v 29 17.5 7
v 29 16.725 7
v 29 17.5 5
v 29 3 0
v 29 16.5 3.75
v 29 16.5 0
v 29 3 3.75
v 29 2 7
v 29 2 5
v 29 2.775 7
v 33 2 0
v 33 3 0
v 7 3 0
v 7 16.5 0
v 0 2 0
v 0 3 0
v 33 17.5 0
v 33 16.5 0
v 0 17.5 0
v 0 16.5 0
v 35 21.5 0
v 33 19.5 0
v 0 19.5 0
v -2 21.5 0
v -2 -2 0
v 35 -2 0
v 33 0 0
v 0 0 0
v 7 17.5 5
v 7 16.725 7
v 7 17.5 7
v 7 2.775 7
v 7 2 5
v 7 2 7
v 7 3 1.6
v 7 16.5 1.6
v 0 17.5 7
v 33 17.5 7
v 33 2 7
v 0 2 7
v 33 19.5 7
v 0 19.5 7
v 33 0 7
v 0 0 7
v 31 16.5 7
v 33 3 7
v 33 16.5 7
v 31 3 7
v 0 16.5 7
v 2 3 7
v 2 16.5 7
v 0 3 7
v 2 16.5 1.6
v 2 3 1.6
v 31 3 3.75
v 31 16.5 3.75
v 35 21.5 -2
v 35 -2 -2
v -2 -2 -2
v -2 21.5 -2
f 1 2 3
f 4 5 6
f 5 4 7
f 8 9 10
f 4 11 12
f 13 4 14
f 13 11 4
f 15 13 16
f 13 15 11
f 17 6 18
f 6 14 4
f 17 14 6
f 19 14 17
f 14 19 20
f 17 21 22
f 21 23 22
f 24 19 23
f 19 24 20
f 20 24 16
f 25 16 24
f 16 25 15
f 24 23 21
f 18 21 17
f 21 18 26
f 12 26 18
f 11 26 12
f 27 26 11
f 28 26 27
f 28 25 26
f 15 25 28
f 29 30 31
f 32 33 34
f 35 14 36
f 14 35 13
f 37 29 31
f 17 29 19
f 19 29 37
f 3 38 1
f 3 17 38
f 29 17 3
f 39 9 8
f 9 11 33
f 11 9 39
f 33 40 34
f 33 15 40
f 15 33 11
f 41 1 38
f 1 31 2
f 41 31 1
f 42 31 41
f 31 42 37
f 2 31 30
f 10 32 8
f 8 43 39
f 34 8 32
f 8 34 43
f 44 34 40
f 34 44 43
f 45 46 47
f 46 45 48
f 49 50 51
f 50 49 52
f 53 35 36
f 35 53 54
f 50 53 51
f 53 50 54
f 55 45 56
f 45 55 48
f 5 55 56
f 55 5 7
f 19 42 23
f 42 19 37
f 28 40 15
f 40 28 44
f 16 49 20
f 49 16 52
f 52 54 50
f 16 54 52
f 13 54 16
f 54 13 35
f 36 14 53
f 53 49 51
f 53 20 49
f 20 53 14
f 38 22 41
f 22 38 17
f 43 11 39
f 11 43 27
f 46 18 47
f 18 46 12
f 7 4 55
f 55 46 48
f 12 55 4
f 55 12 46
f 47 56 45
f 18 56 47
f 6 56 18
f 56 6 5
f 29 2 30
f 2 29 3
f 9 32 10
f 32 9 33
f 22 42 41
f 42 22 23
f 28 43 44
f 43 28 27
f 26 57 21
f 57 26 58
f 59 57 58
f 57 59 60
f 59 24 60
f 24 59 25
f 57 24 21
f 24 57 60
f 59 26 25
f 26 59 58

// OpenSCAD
length=29;
width=15.5;
height=5;
thickness=2;
rfpcbthickness=1.25;
pinheight=3.4;
pinlength=5;


module cutout(){
    translate([thickness+pinlength,thickness,0]) cube([length-thickness-pinlength,width,height]);
    translate([thickness,thickness,height-pinheight]) cube([pinlength,width,pinheight+thickness]);
    translate([thickness,thickness,height-rfpcbthickness]) cube([length,width,rfpcbthickness]);
    translate([0,thickness,0]) cube([thickness+pinlength,thickness/2,height+thickness]);
    translate([0,width+thickness/2,0]) cube([thickness+pinlength,thickness/2,height+thickness]);
    translate([length,thickness,0]) cube([thickness*2,thickness/2,height+thickness]);
    translate([length,width+thickness/2,0]) cube([thickness*2,thickness/2,height+thickness]);
    translate([thickness,thickness+width/2,height]) {
        linear_extrude(height=thickness,scale=[1,.9]){
            translate([0,-width/2,0]) square([length,width]);
        }
    }
}

module radiomount(){
    difference(){
        cube([length+2*thickness,width+2*thickness,height+thickness]);
        cutout();
        
    }
}

radiomount();
translate([-thickness,-thickness,-thickness]) cube([length+4*thickness,width+4*thickness,thickness]);


//cutout();
